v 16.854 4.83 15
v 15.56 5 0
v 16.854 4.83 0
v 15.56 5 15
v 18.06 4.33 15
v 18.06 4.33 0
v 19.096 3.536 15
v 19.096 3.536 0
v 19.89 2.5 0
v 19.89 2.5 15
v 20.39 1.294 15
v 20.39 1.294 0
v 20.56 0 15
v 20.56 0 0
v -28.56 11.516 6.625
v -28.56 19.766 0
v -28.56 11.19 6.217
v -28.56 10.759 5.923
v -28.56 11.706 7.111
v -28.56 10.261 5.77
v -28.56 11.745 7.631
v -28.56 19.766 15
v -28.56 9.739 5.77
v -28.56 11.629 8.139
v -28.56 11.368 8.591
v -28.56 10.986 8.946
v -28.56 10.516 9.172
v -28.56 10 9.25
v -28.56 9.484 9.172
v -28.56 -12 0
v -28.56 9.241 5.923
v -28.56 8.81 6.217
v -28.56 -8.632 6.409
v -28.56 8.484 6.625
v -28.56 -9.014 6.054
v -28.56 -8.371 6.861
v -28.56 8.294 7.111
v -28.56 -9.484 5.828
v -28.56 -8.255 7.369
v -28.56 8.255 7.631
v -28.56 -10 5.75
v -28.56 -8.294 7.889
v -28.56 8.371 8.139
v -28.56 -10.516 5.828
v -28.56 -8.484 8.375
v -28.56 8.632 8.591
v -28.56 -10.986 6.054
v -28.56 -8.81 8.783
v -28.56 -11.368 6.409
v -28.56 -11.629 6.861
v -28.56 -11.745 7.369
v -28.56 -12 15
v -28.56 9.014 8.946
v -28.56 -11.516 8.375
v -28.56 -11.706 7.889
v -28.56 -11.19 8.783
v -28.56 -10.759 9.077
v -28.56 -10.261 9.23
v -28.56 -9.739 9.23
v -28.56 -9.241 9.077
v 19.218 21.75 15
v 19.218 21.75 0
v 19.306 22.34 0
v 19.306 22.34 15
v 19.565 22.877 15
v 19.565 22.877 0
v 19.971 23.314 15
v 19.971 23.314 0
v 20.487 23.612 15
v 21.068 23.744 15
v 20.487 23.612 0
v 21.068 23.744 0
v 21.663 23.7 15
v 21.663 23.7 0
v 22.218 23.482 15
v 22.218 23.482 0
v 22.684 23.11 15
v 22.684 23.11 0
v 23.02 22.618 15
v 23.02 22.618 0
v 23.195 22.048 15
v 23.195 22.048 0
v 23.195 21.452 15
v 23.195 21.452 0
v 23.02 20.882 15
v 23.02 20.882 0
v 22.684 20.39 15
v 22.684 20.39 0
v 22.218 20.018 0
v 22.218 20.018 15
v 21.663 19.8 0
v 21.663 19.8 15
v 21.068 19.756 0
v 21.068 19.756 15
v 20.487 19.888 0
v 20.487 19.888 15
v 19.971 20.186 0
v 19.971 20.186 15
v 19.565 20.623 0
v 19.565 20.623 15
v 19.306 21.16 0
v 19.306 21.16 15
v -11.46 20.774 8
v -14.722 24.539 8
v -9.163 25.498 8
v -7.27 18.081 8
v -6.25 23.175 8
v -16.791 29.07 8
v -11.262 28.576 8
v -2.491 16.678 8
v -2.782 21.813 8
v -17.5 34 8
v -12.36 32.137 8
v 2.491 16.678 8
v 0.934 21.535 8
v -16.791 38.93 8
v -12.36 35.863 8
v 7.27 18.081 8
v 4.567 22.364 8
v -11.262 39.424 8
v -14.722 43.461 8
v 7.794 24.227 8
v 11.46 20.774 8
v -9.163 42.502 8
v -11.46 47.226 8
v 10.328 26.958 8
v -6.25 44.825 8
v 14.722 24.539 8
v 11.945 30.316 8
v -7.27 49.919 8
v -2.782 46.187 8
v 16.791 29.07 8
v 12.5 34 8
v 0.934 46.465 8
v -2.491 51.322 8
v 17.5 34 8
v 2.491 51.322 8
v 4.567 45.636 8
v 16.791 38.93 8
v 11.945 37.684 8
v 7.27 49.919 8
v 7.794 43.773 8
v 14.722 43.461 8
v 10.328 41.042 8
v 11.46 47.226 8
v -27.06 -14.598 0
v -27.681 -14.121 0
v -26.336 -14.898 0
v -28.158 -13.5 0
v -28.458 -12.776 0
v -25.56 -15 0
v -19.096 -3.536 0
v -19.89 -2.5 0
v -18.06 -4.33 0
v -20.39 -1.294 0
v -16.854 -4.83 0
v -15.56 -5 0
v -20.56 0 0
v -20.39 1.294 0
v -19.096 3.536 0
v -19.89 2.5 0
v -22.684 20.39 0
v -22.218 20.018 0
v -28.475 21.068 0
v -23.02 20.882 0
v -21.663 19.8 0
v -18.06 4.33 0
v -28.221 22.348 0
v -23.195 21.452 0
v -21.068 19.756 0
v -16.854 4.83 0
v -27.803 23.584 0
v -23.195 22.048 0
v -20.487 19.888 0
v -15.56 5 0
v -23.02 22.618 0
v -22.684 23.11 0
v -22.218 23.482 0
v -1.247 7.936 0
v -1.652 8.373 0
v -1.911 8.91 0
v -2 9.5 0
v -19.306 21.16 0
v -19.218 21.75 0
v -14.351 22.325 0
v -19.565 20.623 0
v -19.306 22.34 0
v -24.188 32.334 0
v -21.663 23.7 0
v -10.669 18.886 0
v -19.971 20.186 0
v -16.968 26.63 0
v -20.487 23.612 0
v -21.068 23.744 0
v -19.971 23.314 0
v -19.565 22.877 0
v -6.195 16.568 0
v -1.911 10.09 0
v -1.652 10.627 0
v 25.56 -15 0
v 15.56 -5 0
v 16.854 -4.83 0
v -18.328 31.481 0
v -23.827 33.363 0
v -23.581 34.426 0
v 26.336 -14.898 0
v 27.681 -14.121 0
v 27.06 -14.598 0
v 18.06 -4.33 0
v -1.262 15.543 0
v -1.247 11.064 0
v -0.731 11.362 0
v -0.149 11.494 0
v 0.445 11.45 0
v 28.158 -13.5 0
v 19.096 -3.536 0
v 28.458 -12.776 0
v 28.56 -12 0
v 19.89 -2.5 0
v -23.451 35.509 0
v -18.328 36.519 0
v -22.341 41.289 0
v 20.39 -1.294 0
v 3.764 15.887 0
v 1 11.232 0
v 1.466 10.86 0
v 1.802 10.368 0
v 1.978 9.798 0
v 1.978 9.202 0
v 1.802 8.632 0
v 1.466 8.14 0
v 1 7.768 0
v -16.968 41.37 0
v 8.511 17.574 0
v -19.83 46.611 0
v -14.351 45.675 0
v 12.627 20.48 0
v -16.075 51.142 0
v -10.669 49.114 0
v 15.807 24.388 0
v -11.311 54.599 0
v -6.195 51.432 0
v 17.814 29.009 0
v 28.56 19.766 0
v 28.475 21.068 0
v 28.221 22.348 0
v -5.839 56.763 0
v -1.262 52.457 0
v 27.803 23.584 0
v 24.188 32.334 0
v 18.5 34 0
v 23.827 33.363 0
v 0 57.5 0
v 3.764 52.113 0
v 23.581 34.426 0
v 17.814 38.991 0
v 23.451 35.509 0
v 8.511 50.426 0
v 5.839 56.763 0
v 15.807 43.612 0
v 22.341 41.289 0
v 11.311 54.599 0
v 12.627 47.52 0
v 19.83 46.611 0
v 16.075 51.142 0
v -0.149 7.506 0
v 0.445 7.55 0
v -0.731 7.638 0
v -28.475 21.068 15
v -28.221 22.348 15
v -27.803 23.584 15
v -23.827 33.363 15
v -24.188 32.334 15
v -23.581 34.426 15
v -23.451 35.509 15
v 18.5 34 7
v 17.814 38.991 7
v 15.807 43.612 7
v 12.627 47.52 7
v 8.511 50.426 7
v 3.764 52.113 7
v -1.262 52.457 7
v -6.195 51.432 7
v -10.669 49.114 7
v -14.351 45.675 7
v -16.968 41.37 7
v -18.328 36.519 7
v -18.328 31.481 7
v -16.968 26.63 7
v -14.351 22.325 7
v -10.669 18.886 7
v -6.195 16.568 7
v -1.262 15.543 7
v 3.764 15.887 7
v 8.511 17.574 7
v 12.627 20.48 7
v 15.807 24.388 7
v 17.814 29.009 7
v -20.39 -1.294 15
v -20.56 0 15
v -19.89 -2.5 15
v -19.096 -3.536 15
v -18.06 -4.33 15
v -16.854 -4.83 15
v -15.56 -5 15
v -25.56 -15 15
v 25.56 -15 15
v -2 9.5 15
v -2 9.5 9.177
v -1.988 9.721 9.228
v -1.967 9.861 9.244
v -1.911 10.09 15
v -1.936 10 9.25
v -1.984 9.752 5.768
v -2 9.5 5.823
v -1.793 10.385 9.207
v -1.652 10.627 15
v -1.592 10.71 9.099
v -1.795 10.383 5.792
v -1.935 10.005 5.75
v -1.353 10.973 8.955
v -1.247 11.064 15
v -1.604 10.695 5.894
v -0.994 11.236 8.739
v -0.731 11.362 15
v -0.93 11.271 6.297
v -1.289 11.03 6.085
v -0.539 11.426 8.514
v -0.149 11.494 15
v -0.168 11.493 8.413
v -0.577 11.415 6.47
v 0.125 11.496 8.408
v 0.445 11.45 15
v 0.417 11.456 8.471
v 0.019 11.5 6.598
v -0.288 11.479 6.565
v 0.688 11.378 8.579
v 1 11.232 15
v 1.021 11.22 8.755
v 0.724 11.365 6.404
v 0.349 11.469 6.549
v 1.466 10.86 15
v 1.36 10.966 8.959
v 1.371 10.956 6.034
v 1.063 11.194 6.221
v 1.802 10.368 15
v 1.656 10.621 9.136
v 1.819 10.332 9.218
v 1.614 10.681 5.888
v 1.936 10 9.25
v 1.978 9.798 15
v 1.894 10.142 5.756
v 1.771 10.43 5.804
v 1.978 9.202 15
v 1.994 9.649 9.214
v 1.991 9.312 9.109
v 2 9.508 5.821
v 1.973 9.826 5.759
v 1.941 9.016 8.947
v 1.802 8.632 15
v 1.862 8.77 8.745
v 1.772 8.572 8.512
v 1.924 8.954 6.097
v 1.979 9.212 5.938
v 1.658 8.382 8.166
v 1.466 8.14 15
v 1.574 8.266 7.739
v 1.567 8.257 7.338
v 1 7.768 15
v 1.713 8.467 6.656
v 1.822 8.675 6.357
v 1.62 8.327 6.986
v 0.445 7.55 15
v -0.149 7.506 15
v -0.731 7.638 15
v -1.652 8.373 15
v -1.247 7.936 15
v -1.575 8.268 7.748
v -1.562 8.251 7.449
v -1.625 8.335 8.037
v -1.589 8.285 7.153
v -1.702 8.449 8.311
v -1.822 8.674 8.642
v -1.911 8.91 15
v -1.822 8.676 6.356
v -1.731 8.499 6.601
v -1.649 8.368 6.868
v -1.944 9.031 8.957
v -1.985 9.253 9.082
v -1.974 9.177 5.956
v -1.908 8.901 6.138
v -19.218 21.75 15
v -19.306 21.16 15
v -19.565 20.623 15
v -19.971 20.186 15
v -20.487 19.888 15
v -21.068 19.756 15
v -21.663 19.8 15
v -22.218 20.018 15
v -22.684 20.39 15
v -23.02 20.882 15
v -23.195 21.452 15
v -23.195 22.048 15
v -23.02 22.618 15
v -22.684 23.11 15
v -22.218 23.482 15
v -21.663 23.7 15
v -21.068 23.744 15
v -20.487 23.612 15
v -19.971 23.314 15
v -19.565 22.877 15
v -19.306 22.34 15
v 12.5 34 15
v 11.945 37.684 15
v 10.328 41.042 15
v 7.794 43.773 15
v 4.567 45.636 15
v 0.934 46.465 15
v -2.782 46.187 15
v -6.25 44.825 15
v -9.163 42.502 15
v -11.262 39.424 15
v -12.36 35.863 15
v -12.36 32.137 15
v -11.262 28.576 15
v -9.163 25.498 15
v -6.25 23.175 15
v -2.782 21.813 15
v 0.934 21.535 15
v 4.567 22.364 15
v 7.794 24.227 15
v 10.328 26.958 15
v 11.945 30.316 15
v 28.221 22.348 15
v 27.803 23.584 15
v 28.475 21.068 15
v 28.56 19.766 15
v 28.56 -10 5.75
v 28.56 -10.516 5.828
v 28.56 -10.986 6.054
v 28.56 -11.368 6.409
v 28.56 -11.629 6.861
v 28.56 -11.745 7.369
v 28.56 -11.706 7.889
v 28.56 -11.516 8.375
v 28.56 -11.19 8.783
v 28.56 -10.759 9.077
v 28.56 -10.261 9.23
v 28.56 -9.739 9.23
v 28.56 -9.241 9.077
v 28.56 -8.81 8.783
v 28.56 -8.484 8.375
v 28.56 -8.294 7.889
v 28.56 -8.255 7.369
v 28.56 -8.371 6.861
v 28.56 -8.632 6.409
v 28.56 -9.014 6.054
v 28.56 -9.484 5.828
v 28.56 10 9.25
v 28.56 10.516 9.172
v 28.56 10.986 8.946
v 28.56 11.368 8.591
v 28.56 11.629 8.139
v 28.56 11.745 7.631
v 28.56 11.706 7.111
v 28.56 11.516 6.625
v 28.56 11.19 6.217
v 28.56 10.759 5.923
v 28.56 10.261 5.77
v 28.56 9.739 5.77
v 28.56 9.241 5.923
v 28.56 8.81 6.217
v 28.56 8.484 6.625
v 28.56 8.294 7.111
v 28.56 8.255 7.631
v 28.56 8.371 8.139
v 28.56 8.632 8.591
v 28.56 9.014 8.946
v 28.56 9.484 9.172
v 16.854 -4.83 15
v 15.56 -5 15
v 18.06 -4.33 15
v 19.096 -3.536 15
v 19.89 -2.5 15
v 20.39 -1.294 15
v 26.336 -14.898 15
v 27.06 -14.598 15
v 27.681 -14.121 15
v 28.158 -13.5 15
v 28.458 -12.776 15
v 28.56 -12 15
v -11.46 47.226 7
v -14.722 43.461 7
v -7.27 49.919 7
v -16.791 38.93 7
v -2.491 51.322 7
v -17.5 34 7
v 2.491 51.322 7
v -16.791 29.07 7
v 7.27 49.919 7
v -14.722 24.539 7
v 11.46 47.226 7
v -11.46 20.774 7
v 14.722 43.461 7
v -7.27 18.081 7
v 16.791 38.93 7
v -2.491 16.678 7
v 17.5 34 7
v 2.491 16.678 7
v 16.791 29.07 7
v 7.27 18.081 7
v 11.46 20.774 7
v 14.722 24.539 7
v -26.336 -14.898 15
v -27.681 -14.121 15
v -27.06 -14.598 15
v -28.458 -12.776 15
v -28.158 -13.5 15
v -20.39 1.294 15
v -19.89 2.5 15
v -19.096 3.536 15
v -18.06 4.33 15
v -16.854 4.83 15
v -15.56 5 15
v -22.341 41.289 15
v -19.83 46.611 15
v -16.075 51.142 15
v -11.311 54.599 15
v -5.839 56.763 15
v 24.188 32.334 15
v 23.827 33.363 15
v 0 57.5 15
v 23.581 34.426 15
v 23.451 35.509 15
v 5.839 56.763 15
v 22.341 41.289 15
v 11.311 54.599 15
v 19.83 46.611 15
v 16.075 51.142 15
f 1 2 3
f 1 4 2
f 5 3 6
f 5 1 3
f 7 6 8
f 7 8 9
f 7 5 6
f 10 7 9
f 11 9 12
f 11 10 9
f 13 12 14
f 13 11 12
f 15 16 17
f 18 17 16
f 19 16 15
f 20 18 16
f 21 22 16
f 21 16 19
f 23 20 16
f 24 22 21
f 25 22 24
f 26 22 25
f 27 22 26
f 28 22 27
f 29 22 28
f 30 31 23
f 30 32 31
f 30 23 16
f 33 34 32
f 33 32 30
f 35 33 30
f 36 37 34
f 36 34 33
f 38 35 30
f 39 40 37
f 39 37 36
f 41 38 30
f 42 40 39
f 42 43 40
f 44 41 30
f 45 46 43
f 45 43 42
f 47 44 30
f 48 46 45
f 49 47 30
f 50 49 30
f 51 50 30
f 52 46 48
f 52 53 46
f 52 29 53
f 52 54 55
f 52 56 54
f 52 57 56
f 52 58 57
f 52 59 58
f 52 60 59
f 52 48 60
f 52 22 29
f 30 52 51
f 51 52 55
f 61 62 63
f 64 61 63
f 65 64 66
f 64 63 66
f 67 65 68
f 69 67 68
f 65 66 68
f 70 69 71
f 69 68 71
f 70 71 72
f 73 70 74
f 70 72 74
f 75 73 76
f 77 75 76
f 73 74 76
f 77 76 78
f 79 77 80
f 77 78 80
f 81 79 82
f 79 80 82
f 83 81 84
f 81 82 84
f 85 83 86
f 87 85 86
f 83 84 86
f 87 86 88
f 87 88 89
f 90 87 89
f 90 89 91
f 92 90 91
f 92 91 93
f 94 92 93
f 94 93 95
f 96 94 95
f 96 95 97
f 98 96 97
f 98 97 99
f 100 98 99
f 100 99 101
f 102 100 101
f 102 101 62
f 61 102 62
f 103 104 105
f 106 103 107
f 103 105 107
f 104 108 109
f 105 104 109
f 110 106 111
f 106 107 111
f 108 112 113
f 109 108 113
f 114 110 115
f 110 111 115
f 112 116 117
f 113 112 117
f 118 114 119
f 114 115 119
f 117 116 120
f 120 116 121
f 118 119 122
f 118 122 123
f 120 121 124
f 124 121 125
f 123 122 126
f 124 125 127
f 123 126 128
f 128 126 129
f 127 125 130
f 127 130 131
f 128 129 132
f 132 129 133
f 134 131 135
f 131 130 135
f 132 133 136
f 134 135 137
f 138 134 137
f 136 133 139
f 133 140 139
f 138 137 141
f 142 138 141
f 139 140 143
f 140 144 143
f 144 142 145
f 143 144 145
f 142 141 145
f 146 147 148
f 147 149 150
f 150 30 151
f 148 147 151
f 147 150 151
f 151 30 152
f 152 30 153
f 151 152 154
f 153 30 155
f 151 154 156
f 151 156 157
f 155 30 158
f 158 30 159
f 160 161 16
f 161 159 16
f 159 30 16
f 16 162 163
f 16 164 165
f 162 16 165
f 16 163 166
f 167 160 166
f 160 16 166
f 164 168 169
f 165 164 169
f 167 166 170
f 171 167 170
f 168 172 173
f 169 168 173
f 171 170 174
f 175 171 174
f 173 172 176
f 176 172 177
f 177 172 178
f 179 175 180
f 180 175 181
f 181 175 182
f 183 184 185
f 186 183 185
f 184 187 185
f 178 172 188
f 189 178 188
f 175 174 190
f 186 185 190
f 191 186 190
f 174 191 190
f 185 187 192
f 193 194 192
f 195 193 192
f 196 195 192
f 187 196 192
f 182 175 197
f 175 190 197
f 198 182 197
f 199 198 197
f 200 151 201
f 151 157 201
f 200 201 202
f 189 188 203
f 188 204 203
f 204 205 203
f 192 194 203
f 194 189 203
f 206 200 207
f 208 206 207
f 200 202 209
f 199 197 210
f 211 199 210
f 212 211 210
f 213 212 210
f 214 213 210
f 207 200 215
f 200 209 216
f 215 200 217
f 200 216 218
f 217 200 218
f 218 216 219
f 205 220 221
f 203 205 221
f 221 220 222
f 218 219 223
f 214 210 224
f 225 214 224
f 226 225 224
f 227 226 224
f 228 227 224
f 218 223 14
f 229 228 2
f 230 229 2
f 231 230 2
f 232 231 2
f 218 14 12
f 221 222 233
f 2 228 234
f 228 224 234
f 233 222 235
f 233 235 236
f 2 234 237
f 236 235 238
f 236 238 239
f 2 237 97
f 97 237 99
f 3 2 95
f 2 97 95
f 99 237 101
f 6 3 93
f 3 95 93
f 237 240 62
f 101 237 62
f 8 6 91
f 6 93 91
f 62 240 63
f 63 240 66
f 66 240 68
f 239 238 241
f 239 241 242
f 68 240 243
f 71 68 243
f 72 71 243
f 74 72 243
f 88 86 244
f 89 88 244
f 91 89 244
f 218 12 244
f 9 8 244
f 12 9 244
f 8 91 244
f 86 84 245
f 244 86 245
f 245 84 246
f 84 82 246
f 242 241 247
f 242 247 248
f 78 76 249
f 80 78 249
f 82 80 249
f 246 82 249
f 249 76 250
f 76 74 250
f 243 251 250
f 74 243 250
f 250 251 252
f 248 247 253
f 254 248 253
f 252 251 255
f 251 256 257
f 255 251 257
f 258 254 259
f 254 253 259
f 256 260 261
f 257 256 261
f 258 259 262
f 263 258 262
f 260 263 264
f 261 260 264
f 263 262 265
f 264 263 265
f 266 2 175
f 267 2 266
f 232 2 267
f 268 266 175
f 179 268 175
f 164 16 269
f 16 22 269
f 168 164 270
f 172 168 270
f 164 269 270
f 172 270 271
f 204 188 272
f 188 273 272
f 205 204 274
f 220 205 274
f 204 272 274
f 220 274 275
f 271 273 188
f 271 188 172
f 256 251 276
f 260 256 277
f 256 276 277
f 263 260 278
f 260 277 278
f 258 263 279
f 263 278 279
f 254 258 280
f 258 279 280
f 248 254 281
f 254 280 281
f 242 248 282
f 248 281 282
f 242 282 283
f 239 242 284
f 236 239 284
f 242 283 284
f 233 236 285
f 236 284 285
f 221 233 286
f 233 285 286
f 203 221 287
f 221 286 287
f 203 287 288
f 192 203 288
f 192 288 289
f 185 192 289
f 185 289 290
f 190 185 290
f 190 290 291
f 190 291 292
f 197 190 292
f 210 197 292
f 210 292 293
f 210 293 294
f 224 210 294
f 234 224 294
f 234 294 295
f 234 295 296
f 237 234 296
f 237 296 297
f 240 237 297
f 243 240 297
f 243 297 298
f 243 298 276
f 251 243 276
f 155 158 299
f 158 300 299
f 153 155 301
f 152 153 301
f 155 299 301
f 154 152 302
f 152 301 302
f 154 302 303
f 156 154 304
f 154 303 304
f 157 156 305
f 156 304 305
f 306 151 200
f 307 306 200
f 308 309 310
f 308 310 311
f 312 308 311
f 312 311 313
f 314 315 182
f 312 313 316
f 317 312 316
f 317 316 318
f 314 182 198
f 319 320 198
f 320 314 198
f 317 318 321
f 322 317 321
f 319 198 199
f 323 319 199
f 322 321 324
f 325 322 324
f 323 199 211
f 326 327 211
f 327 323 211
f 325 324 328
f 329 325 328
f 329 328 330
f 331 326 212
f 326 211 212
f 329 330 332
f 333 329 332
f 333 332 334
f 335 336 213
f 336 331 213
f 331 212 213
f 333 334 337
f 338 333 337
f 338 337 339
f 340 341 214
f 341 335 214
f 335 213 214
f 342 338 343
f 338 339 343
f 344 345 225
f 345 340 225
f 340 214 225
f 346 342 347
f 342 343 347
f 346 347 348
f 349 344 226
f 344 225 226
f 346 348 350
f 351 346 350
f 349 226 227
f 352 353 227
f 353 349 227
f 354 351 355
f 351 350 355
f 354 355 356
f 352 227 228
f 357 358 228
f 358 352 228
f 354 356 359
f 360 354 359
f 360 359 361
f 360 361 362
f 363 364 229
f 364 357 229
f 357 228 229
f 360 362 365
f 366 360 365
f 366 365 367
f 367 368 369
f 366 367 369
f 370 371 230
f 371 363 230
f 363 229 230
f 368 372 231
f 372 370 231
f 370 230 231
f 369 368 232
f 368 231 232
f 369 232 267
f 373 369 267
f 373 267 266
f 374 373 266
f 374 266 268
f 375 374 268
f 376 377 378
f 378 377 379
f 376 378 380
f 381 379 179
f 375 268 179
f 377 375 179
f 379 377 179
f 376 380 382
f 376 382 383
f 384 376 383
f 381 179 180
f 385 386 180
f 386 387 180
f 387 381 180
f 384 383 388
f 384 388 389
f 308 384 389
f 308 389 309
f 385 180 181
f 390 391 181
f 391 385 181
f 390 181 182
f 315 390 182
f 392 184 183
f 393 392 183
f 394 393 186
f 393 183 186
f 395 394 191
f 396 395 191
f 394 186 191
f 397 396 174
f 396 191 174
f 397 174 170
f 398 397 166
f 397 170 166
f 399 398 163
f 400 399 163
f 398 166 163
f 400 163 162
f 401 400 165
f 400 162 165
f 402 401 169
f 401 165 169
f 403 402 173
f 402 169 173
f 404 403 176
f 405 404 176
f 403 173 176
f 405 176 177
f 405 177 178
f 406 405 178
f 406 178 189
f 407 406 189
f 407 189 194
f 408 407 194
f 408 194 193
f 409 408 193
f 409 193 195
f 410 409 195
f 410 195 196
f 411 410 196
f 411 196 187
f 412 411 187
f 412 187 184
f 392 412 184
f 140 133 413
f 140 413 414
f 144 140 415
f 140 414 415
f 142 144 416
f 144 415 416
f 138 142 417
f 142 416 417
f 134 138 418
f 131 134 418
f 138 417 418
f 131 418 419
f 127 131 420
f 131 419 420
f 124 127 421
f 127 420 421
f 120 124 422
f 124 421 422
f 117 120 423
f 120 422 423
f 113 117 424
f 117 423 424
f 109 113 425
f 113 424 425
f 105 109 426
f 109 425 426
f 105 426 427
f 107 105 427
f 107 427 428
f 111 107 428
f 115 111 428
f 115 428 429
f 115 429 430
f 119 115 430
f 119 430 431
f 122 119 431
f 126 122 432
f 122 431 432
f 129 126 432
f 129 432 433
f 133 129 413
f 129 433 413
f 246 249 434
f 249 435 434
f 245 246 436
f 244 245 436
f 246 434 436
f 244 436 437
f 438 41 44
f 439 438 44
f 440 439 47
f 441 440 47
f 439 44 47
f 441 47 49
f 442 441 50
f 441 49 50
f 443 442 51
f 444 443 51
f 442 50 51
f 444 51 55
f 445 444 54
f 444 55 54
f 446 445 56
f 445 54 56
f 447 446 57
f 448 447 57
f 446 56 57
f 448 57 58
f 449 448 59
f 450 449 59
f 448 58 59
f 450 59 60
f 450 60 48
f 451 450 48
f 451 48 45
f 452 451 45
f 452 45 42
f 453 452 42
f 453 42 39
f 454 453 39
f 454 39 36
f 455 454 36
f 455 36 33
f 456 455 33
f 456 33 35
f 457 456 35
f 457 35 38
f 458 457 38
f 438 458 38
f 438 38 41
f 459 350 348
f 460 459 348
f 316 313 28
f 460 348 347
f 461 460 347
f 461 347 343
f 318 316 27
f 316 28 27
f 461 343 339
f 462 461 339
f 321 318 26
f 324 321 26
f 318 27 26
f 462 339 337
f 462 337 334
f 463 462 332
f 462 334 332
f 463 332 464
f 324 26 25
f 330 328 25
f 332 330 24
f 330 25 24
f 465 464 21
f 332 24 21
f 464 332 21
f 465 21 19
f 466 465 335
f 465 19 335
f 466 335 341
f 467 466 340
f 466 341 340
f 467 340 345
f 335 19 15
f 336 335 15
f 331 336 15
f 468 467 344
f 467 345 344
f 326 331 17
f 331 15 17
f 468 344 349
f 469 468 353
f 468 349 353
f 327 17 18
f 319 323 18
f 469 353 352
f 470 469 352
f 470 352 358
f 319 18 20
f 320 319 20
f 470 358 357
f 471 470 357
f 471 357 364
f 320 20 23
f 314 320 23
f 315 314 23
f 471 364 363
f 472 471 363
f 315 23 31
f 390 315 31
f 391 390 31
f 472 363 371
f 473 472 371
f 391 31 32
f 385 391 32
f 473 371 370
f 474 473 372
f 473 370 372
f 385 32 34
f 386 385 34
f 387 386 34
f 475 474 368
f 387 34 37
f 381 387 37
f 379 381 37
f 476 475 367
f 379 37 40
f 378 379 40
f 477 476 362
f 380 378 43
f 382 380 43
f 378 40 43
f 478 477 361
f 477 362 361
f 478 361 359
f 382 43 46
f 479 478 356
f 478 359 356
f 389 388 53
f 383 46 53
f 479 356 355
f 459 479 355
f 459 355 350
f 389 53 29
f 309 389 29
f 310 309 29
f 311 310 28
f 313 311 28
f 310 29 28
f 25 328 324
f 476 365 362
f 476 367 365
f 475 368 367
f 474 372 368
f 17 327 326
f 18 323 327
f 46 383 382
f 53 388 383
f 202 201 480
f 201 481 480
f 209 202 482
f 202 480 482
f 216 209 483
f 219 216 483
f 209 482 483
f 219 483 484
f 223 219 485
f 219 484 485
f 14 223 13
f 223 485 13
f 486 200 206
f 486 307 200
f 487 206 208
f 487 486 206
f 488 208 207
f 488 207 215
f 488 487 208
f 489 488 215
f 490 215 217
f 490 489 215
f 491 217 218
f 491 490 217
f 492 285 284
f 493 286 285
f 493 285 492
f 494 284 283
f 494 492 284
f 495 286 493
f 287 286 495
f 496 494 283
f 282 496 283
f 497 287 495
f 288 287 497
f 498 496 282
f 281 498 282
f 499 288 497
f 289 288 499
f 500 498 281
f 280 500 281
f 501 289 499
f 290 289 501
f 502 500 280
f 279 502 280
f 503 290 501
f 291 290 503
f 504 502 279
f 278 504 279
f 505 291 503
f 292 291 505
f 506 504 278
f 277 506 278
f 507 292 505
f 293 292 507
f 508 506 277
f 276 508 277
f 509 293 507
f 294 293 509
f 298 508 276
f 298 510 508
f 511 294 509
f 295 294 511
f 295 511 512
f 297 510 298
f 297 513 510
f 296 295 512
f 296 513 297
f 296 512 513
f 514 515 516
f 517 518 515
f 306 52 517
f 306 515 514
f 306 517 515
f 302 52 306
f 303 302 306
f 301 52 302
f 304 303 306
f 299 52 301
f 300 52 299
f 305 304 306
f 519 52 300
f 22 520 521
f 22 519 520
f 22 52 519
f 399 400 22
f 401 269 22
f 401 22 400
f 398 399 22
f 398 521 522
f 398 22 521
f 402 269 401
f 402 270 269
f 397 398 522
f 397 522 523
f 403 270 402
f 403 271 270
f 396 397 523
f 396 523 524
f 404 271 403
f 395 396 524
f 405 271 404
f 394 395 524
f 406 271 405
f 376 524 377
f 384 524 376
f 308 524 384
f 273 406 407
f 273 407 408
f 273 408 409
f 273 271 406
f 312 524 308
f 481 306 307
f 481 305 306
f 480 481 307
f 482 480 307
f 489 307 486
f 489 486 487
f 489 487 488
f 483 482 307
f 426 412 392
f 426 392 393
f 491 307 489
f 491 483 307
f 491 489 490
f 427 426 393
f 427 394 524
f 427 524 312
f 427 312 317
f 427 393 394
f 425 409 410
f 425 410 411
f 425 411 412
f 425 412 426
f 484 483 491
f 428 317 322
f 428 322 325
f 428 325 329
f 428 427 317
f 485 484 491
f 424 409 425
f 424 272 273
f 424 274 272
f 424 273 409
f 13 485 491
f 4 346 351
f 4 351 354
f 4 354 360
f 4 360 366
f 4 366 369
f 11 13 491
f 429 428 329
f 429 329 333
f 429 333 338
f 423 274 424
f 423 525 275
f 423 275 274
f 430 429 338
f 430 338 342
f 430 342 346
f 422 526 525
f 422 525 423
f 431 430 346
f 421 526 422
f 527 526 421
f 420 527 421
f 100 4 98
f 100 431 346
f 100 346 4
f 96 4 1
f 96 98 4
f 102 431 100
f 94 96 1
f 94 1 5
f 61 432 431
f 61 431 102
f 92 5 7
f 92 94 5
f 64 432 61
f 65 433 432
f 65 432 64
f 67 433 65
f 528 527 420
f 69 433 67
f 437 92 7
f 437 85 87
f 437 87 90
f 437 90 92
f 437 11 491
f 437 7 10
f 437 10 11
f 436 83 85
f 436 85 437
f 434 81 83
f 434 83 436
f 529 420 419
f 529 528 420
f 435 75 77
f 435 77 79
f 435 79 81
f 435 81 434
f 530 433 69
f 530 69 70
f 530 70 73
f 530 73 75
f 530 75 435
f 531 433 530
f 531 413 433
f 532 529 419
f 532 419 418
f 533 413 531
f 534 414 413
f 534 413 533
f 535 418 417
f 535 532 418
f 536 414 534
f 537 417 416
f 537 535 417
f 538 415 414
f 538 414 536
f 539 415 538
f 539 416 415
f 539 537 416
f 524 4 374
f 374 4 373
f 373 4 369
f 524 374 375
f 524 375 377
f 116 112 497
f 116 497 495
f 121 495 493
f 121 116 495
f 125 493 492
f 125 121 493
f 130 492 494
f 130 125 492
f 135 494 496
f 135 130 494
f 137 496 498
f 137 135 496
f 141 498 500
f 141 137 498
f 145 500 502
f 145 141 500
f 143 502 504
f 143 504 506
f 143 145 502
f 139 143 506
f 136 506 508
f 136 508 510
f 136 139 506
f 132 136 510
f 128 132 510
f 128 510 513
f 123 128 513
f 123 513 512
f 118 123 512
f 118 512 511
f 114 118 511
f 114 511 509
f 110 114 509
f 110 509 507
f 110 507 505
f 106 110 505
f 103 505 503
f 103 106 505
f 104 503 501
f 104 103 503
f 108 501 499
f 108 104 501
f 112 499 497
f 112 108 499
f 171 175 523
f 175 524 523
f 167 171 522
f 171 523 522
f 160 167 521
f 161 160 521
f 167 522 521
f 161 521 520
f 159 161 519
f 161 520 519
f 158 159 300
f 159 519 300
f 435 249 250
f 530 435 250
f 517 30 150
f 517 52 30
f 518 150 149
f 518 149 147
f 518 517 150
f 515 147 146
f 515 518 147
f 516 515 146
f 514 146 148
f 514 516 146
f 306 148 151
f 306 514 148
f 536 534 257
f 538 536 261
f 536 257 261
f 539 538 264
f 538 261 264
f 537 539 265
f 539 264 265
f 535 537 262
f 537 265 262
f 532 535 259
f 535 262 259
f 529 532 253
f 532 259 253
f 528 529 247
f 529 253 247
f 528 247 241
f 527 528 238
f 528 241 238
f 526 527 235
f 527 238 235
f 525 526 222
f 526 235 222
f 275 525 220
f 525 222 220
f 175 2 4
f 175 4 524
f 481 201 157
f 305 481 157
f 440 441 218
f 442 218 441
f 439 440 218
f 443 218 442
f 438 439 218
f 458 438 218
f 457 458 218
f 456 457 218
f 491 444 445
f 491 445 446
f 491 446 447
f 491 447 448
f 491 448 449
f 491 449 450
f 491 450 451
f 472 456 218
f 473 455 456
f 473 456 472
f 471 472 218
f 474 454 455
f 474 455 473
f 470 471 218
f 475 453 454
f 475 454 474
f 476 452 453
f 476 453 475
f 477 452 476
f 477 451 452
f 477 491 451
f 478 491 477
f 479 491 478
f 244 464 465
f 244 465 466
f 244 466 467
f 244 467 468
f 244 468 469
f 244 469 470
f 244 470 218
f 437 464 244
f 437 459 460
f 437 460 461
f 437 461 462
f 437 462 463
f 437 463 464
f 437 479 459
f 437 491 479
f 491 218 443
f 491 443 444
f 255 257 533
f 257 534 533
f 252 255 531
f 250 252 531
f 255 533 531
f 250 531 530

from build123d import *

# Parameters (mm, degrees)
SKETCH_1_W          = 57.12
SKETCH_1_H          = 30
EXTRUDE_1_DEPTH     = 15
SKETCH_2_R          = 1.75
CUT_EXTRUDE_1_DEPTH = 61.93188328
SKETCH_4_R          = 18.5
EXTRUDE_4_DEPTH     = 15
SKETCH_5_R          = 18.5
SKETCH_5_R_2        = 12.5
EXTRUDE_5_DEPTH     = 7
SKETCH_6_R          = 18.5
SKETCH_6_R_2        = 17.5
EXTRUDE_6_DEPTH     = 1
FILLET_1_R          = 3
SKETCH_7_R          = 2
CUT_EXTRUDE_2_DEPTH = 71.387692106
CUT_EXTRUDE_3_DEPTH = 71.387692168
FILLET_2_R          = 10
SKETCH_9_W          = 41.12
SKETCH_9_H          = 10
CUT_EXTRUDE_4_DEPTH = 66.931203604
FILLET_3_R          = 5


with BuildPart() as part:
    # ｽｹｯﾁ1 → ﾎﾞｽ - 押し出し1 (new body)
    with BuildSketch(Plane.XY):
        Rectangle(SKETCH_1_W, SKETCH_1_H)
    extrude(amount=EXTRUDE_1_DEPTH)

    # ｽｹｯﾁ2 → ｶｯﾄ - 押し出し1 (cut, through all)
    with BuildSketch(Plane.ZY.offset(28.56)):
        with Locations((7.5, 10)):
            Circle(SKETCH_2_R)
        with Locations(Location((7.5, -10, 0), (0, 0, 180))):
            Circle(SKETCH_2_R)
    extrude(amount=-CUT_EXTRUDE_1_DEPTH, mode=Mode.SUBTRACT)

    # ｽｹｯﾁ4 → ﾎﾞｽ - 押し出し4 (add, through all)
    with BuildSketch(Plane.XY.offset(15)):
        with BuildLine():
            Line((-28.56, 34), (-28.56, 15))
            Line((-28.56, 15), (28.56, 15))
            Line((28.56, 15), (28.56, 34))
            ThreePointArc((28.56, 34), (0, 62.56), (-28.56, 34))
        make_face()
        with Locations((0, 34)):
            Circle(SKETCH_4_R, mode=Mode.SUBTRACT)
    extrude(amount=-EXTRUDE_4_DEPTH)

    # ｽｹｯﾁ5 → ﾎﾞｽ - 押し出し5 (add)
    with BuildSketch(Plane.XY.offset(15)):
        with Locations((0, 34)):
            Circle(SKETCH_5_R)
        with Locations((0, 34)):
            Circle(SKETCH_5_R_2, mode=Mode.SUBTRACT)
    extrude(amount=-EXTRUDE_5_DEPTH)

    # ｽｹｯﾁ6 → ﾎﾞｽ - 押し出し6 (add)
    with BuildSketch(Plane(origin=(0, 0, 8), x_dir=(-1, 0, 0), z_dir=(0, 0, -1))):
        with Locations(Location((0, 34, 0), (0, 0, 180))):
            Circle(SKETCH_6_R)
        with Locations((0, 34)):
            Circle(SKETCH_6_R_2, mode=Mode.SUBTRACT)
    extrude(amount=EXTRUDE_6_DEPTH)

    # ﾌｨﾚｯﾄ1
    fillet_1_edges = [part.edges().sort_by_distance(p)[0] for p in [
        (28.56, -15, 7.5),
        (-28.56, -15, 7.5),
    ]]
    fillet(fillet_1_edges, radius=FILLET_1_R)

    # ｽｹｯﾁ7 → ｶｯﾄ - 押し出し2 (cut, through all)
    with BuildSketch(Plane(origin=(0, 0, 0), x_dir=(-1, 0, 0), z_dir=(0, 0, -1))):
        with Locations((0, 9.5)):
            Circle(SKETCH_7_R)
        with Locations((-21.217622393, 21.75)):
            Circle(SKETCH_7_R)
        with Locations(Location((21.217622393, 21.75, 0), (0, 0, 180))):
            Circle(SKETCH_7_R)
    extrude(amount=-CUT_EXTRUDE_2_DEPTH, mode=Mode.SUBTRACT)

    # ｽｹｯﾁ8 → ｶｯﾄ - 押し出し3 (cut, through all)
    with BuildSketch(Plane(origin=(0, 0, 0), x_dir=(-1, 0, 0), z_dir=(0, 0, -1))):
        with BuildLine():
            Line((-28.56, 34), (-28.56, 21.75))
            Line((-28.56, 21.75), (-23.5, 34))
            ThreePointArc((-23.5, 34), (0, 57.5), (23.5, 34))
            Line((23.5, 34), (28.56, 21.75))
            Line((28.56, 21.75), (28.56, 34))
            ThreePointArc((28.56, 34), (0, 62.56), (-28.56, 34))
        make_face()
    extrude(amount=-CUT_EXTRUDE_3_DEPTH, mode=Mode.SUBTRACT)

    # ﾌｨﾚｯﾄ2
    fillet_2_edges = [part.edges().sort_by_distance(p)[0] for p in [
        (23.5, 34, 7.5),
        (28.56, 21.75, 7.5),
        (-28.56, 21.75, 7.5),
        (-23.5, 34, 7.5),
    ]]
    fillet(fillet_2_edges, radius=FILLET_2_R)

    # ｽｹｯﾁ9 → ｶｯﾄ - 押し出し4 (cut, through all)
    with BuildSketch(Plane(origin=(0, 0, 0), x_dir=(-1, 0, 0), z_dir=(0, 0, -1))):
        Rectangle(SKETCH_9_W, SKETCH_9_H)
    extrude(amount=-CUT_EXTRUDE_4_DEPTH, mode=Mode.SUBTRACT)

    # ﾌｨﾚｯﾄ3
    fillet_3_edges = [part.edges().sort_by_distance(p)[0] for p in [
        (-20.56, 5, 7.5),
        (-20.56, -5, 7.5),
        (20.56, 5, 7.5),
        (20.56, -5, 7.5),
    ]]
    fillet(fillet_3_edges, radius=FILLET_3_R - 0.0001)  # a hair under: the kernel refuses the full size


solid = part.part
